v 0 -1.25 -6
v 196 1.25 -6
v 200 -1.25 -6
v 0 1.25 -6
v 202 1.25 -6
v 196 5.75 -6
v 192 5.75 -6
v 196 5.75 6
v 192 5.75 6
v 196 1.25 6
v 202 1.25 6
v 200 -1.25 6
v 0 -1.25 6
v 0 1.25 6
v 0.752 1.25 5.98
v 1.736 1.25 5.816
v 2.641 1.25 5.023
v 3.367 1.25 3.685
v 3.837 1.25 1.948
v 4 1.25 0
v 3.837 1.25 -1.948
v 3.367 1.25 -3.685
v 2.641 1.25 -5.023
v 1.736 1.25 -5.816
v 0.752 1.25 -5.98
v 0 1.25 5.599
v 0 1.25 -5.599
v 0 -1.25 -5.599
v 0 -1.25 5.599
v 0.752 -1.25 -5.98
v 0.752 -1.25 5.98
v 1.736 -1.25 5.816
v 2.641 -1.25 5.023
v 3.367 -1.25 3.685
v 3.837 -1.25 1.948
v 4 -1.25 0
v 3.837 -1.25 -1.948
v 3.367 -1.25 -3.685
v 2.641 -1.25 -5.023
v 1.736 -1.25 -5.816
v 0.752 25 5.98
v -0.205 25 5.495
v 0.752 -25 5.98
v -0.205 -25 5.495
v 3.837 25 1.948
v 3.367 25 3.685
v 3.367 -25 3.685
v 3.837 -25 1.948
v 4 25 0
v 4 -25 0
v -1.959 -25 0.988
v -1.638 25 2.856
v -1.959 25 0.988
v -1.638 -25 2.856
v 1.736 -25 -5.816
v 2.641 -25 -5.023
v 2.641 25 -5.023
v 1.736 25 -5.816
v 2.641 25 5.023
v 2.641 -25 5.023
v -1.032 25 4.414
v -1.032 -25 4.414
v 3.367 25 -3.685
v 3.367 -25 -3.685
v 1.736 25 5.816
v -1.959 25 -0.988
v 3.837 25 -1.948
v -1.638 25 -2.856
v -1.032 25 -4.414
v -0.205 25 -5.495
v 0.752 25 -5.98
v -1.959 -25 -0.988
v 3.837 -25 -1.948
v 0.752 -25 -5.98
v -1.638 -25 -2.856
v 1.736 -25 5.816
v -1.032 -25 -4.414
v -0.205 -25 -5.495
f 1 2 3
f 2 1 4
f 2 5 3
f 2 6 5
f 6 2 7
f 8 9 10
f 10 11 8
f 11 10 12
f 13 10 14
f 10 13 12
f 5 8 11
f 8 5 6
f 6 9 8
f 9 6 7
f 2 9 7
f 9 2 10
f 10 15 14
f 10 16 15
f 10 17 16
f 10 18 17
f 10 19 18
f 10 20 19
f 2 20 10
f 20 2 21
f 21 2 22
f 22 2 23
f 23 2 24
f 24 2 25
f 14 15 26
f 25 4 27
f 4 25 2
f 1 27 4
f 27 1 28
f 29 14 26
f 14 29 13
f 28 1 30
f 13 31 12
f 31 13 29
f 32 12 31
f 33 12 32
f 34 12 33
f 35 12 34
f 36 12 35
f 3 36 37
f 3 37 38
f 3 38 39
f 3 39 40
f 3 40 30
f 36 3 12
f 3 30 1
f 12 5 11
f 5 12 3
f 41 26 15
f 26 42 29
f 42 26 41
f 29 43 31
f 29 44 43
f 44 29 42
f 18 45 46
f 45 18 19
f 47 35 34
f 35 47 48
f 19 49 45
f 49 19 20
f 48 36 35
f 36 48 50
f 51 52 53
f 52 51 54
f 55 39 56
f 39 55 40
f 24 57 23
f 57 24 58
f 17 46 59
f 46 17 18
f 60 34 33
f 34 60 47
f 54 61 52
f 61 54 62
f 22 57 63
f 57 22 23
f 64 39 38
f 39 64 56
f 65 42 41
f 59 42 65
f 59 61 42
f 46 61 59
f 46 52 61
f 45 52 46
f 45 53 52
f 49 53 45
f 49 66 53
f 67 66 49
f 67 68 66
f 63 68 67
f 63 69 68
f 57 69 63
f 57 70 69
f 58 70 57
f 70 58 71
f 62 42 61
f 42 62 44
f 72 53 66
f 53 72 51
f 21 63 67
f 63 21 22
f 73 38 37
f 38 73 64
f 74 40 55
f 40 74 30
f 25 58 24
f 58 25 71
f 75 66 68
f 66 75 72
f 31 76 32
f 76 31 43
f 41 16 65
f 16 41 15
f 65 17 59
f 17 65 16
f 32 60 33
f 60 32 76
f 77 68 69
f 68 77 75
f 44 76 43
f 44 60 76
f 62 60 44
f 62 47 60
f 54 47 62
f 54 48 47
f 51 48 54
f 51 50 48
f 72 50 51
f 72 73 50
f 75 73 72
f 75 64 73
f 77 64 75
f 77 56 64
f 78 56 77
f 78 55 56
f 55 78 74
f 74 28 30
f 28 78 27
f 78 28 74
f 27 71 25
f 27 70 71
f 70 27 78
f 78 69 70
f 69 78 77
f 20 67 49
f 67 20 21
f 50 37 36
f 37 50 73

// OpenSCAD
module shape1(){
    X=200;
    Y=2.5;
    X1=4;
    Y1=4.5;
    Z=12;

    //Y + Y1 <= 7
    
    translate([0,-Y/2,-Z/2])
    linear_extrude(height=Z)
    polygon([
        [0,0],[X,0],
        [X+2,Y],[X-X1,Y+Y1], [X-X1-X1,Y+Y1],
        [X-X1,Y],[0,Y]
        ]
    );
}

module shape2(){
    Y=50;
    Z=12;
    scale([0.5,1,1])
    translate([2,0,0])
    rotate([90,0,0])
    cylinder(h=Y,d=Z, center=true);
}

shape1();
shape2();
